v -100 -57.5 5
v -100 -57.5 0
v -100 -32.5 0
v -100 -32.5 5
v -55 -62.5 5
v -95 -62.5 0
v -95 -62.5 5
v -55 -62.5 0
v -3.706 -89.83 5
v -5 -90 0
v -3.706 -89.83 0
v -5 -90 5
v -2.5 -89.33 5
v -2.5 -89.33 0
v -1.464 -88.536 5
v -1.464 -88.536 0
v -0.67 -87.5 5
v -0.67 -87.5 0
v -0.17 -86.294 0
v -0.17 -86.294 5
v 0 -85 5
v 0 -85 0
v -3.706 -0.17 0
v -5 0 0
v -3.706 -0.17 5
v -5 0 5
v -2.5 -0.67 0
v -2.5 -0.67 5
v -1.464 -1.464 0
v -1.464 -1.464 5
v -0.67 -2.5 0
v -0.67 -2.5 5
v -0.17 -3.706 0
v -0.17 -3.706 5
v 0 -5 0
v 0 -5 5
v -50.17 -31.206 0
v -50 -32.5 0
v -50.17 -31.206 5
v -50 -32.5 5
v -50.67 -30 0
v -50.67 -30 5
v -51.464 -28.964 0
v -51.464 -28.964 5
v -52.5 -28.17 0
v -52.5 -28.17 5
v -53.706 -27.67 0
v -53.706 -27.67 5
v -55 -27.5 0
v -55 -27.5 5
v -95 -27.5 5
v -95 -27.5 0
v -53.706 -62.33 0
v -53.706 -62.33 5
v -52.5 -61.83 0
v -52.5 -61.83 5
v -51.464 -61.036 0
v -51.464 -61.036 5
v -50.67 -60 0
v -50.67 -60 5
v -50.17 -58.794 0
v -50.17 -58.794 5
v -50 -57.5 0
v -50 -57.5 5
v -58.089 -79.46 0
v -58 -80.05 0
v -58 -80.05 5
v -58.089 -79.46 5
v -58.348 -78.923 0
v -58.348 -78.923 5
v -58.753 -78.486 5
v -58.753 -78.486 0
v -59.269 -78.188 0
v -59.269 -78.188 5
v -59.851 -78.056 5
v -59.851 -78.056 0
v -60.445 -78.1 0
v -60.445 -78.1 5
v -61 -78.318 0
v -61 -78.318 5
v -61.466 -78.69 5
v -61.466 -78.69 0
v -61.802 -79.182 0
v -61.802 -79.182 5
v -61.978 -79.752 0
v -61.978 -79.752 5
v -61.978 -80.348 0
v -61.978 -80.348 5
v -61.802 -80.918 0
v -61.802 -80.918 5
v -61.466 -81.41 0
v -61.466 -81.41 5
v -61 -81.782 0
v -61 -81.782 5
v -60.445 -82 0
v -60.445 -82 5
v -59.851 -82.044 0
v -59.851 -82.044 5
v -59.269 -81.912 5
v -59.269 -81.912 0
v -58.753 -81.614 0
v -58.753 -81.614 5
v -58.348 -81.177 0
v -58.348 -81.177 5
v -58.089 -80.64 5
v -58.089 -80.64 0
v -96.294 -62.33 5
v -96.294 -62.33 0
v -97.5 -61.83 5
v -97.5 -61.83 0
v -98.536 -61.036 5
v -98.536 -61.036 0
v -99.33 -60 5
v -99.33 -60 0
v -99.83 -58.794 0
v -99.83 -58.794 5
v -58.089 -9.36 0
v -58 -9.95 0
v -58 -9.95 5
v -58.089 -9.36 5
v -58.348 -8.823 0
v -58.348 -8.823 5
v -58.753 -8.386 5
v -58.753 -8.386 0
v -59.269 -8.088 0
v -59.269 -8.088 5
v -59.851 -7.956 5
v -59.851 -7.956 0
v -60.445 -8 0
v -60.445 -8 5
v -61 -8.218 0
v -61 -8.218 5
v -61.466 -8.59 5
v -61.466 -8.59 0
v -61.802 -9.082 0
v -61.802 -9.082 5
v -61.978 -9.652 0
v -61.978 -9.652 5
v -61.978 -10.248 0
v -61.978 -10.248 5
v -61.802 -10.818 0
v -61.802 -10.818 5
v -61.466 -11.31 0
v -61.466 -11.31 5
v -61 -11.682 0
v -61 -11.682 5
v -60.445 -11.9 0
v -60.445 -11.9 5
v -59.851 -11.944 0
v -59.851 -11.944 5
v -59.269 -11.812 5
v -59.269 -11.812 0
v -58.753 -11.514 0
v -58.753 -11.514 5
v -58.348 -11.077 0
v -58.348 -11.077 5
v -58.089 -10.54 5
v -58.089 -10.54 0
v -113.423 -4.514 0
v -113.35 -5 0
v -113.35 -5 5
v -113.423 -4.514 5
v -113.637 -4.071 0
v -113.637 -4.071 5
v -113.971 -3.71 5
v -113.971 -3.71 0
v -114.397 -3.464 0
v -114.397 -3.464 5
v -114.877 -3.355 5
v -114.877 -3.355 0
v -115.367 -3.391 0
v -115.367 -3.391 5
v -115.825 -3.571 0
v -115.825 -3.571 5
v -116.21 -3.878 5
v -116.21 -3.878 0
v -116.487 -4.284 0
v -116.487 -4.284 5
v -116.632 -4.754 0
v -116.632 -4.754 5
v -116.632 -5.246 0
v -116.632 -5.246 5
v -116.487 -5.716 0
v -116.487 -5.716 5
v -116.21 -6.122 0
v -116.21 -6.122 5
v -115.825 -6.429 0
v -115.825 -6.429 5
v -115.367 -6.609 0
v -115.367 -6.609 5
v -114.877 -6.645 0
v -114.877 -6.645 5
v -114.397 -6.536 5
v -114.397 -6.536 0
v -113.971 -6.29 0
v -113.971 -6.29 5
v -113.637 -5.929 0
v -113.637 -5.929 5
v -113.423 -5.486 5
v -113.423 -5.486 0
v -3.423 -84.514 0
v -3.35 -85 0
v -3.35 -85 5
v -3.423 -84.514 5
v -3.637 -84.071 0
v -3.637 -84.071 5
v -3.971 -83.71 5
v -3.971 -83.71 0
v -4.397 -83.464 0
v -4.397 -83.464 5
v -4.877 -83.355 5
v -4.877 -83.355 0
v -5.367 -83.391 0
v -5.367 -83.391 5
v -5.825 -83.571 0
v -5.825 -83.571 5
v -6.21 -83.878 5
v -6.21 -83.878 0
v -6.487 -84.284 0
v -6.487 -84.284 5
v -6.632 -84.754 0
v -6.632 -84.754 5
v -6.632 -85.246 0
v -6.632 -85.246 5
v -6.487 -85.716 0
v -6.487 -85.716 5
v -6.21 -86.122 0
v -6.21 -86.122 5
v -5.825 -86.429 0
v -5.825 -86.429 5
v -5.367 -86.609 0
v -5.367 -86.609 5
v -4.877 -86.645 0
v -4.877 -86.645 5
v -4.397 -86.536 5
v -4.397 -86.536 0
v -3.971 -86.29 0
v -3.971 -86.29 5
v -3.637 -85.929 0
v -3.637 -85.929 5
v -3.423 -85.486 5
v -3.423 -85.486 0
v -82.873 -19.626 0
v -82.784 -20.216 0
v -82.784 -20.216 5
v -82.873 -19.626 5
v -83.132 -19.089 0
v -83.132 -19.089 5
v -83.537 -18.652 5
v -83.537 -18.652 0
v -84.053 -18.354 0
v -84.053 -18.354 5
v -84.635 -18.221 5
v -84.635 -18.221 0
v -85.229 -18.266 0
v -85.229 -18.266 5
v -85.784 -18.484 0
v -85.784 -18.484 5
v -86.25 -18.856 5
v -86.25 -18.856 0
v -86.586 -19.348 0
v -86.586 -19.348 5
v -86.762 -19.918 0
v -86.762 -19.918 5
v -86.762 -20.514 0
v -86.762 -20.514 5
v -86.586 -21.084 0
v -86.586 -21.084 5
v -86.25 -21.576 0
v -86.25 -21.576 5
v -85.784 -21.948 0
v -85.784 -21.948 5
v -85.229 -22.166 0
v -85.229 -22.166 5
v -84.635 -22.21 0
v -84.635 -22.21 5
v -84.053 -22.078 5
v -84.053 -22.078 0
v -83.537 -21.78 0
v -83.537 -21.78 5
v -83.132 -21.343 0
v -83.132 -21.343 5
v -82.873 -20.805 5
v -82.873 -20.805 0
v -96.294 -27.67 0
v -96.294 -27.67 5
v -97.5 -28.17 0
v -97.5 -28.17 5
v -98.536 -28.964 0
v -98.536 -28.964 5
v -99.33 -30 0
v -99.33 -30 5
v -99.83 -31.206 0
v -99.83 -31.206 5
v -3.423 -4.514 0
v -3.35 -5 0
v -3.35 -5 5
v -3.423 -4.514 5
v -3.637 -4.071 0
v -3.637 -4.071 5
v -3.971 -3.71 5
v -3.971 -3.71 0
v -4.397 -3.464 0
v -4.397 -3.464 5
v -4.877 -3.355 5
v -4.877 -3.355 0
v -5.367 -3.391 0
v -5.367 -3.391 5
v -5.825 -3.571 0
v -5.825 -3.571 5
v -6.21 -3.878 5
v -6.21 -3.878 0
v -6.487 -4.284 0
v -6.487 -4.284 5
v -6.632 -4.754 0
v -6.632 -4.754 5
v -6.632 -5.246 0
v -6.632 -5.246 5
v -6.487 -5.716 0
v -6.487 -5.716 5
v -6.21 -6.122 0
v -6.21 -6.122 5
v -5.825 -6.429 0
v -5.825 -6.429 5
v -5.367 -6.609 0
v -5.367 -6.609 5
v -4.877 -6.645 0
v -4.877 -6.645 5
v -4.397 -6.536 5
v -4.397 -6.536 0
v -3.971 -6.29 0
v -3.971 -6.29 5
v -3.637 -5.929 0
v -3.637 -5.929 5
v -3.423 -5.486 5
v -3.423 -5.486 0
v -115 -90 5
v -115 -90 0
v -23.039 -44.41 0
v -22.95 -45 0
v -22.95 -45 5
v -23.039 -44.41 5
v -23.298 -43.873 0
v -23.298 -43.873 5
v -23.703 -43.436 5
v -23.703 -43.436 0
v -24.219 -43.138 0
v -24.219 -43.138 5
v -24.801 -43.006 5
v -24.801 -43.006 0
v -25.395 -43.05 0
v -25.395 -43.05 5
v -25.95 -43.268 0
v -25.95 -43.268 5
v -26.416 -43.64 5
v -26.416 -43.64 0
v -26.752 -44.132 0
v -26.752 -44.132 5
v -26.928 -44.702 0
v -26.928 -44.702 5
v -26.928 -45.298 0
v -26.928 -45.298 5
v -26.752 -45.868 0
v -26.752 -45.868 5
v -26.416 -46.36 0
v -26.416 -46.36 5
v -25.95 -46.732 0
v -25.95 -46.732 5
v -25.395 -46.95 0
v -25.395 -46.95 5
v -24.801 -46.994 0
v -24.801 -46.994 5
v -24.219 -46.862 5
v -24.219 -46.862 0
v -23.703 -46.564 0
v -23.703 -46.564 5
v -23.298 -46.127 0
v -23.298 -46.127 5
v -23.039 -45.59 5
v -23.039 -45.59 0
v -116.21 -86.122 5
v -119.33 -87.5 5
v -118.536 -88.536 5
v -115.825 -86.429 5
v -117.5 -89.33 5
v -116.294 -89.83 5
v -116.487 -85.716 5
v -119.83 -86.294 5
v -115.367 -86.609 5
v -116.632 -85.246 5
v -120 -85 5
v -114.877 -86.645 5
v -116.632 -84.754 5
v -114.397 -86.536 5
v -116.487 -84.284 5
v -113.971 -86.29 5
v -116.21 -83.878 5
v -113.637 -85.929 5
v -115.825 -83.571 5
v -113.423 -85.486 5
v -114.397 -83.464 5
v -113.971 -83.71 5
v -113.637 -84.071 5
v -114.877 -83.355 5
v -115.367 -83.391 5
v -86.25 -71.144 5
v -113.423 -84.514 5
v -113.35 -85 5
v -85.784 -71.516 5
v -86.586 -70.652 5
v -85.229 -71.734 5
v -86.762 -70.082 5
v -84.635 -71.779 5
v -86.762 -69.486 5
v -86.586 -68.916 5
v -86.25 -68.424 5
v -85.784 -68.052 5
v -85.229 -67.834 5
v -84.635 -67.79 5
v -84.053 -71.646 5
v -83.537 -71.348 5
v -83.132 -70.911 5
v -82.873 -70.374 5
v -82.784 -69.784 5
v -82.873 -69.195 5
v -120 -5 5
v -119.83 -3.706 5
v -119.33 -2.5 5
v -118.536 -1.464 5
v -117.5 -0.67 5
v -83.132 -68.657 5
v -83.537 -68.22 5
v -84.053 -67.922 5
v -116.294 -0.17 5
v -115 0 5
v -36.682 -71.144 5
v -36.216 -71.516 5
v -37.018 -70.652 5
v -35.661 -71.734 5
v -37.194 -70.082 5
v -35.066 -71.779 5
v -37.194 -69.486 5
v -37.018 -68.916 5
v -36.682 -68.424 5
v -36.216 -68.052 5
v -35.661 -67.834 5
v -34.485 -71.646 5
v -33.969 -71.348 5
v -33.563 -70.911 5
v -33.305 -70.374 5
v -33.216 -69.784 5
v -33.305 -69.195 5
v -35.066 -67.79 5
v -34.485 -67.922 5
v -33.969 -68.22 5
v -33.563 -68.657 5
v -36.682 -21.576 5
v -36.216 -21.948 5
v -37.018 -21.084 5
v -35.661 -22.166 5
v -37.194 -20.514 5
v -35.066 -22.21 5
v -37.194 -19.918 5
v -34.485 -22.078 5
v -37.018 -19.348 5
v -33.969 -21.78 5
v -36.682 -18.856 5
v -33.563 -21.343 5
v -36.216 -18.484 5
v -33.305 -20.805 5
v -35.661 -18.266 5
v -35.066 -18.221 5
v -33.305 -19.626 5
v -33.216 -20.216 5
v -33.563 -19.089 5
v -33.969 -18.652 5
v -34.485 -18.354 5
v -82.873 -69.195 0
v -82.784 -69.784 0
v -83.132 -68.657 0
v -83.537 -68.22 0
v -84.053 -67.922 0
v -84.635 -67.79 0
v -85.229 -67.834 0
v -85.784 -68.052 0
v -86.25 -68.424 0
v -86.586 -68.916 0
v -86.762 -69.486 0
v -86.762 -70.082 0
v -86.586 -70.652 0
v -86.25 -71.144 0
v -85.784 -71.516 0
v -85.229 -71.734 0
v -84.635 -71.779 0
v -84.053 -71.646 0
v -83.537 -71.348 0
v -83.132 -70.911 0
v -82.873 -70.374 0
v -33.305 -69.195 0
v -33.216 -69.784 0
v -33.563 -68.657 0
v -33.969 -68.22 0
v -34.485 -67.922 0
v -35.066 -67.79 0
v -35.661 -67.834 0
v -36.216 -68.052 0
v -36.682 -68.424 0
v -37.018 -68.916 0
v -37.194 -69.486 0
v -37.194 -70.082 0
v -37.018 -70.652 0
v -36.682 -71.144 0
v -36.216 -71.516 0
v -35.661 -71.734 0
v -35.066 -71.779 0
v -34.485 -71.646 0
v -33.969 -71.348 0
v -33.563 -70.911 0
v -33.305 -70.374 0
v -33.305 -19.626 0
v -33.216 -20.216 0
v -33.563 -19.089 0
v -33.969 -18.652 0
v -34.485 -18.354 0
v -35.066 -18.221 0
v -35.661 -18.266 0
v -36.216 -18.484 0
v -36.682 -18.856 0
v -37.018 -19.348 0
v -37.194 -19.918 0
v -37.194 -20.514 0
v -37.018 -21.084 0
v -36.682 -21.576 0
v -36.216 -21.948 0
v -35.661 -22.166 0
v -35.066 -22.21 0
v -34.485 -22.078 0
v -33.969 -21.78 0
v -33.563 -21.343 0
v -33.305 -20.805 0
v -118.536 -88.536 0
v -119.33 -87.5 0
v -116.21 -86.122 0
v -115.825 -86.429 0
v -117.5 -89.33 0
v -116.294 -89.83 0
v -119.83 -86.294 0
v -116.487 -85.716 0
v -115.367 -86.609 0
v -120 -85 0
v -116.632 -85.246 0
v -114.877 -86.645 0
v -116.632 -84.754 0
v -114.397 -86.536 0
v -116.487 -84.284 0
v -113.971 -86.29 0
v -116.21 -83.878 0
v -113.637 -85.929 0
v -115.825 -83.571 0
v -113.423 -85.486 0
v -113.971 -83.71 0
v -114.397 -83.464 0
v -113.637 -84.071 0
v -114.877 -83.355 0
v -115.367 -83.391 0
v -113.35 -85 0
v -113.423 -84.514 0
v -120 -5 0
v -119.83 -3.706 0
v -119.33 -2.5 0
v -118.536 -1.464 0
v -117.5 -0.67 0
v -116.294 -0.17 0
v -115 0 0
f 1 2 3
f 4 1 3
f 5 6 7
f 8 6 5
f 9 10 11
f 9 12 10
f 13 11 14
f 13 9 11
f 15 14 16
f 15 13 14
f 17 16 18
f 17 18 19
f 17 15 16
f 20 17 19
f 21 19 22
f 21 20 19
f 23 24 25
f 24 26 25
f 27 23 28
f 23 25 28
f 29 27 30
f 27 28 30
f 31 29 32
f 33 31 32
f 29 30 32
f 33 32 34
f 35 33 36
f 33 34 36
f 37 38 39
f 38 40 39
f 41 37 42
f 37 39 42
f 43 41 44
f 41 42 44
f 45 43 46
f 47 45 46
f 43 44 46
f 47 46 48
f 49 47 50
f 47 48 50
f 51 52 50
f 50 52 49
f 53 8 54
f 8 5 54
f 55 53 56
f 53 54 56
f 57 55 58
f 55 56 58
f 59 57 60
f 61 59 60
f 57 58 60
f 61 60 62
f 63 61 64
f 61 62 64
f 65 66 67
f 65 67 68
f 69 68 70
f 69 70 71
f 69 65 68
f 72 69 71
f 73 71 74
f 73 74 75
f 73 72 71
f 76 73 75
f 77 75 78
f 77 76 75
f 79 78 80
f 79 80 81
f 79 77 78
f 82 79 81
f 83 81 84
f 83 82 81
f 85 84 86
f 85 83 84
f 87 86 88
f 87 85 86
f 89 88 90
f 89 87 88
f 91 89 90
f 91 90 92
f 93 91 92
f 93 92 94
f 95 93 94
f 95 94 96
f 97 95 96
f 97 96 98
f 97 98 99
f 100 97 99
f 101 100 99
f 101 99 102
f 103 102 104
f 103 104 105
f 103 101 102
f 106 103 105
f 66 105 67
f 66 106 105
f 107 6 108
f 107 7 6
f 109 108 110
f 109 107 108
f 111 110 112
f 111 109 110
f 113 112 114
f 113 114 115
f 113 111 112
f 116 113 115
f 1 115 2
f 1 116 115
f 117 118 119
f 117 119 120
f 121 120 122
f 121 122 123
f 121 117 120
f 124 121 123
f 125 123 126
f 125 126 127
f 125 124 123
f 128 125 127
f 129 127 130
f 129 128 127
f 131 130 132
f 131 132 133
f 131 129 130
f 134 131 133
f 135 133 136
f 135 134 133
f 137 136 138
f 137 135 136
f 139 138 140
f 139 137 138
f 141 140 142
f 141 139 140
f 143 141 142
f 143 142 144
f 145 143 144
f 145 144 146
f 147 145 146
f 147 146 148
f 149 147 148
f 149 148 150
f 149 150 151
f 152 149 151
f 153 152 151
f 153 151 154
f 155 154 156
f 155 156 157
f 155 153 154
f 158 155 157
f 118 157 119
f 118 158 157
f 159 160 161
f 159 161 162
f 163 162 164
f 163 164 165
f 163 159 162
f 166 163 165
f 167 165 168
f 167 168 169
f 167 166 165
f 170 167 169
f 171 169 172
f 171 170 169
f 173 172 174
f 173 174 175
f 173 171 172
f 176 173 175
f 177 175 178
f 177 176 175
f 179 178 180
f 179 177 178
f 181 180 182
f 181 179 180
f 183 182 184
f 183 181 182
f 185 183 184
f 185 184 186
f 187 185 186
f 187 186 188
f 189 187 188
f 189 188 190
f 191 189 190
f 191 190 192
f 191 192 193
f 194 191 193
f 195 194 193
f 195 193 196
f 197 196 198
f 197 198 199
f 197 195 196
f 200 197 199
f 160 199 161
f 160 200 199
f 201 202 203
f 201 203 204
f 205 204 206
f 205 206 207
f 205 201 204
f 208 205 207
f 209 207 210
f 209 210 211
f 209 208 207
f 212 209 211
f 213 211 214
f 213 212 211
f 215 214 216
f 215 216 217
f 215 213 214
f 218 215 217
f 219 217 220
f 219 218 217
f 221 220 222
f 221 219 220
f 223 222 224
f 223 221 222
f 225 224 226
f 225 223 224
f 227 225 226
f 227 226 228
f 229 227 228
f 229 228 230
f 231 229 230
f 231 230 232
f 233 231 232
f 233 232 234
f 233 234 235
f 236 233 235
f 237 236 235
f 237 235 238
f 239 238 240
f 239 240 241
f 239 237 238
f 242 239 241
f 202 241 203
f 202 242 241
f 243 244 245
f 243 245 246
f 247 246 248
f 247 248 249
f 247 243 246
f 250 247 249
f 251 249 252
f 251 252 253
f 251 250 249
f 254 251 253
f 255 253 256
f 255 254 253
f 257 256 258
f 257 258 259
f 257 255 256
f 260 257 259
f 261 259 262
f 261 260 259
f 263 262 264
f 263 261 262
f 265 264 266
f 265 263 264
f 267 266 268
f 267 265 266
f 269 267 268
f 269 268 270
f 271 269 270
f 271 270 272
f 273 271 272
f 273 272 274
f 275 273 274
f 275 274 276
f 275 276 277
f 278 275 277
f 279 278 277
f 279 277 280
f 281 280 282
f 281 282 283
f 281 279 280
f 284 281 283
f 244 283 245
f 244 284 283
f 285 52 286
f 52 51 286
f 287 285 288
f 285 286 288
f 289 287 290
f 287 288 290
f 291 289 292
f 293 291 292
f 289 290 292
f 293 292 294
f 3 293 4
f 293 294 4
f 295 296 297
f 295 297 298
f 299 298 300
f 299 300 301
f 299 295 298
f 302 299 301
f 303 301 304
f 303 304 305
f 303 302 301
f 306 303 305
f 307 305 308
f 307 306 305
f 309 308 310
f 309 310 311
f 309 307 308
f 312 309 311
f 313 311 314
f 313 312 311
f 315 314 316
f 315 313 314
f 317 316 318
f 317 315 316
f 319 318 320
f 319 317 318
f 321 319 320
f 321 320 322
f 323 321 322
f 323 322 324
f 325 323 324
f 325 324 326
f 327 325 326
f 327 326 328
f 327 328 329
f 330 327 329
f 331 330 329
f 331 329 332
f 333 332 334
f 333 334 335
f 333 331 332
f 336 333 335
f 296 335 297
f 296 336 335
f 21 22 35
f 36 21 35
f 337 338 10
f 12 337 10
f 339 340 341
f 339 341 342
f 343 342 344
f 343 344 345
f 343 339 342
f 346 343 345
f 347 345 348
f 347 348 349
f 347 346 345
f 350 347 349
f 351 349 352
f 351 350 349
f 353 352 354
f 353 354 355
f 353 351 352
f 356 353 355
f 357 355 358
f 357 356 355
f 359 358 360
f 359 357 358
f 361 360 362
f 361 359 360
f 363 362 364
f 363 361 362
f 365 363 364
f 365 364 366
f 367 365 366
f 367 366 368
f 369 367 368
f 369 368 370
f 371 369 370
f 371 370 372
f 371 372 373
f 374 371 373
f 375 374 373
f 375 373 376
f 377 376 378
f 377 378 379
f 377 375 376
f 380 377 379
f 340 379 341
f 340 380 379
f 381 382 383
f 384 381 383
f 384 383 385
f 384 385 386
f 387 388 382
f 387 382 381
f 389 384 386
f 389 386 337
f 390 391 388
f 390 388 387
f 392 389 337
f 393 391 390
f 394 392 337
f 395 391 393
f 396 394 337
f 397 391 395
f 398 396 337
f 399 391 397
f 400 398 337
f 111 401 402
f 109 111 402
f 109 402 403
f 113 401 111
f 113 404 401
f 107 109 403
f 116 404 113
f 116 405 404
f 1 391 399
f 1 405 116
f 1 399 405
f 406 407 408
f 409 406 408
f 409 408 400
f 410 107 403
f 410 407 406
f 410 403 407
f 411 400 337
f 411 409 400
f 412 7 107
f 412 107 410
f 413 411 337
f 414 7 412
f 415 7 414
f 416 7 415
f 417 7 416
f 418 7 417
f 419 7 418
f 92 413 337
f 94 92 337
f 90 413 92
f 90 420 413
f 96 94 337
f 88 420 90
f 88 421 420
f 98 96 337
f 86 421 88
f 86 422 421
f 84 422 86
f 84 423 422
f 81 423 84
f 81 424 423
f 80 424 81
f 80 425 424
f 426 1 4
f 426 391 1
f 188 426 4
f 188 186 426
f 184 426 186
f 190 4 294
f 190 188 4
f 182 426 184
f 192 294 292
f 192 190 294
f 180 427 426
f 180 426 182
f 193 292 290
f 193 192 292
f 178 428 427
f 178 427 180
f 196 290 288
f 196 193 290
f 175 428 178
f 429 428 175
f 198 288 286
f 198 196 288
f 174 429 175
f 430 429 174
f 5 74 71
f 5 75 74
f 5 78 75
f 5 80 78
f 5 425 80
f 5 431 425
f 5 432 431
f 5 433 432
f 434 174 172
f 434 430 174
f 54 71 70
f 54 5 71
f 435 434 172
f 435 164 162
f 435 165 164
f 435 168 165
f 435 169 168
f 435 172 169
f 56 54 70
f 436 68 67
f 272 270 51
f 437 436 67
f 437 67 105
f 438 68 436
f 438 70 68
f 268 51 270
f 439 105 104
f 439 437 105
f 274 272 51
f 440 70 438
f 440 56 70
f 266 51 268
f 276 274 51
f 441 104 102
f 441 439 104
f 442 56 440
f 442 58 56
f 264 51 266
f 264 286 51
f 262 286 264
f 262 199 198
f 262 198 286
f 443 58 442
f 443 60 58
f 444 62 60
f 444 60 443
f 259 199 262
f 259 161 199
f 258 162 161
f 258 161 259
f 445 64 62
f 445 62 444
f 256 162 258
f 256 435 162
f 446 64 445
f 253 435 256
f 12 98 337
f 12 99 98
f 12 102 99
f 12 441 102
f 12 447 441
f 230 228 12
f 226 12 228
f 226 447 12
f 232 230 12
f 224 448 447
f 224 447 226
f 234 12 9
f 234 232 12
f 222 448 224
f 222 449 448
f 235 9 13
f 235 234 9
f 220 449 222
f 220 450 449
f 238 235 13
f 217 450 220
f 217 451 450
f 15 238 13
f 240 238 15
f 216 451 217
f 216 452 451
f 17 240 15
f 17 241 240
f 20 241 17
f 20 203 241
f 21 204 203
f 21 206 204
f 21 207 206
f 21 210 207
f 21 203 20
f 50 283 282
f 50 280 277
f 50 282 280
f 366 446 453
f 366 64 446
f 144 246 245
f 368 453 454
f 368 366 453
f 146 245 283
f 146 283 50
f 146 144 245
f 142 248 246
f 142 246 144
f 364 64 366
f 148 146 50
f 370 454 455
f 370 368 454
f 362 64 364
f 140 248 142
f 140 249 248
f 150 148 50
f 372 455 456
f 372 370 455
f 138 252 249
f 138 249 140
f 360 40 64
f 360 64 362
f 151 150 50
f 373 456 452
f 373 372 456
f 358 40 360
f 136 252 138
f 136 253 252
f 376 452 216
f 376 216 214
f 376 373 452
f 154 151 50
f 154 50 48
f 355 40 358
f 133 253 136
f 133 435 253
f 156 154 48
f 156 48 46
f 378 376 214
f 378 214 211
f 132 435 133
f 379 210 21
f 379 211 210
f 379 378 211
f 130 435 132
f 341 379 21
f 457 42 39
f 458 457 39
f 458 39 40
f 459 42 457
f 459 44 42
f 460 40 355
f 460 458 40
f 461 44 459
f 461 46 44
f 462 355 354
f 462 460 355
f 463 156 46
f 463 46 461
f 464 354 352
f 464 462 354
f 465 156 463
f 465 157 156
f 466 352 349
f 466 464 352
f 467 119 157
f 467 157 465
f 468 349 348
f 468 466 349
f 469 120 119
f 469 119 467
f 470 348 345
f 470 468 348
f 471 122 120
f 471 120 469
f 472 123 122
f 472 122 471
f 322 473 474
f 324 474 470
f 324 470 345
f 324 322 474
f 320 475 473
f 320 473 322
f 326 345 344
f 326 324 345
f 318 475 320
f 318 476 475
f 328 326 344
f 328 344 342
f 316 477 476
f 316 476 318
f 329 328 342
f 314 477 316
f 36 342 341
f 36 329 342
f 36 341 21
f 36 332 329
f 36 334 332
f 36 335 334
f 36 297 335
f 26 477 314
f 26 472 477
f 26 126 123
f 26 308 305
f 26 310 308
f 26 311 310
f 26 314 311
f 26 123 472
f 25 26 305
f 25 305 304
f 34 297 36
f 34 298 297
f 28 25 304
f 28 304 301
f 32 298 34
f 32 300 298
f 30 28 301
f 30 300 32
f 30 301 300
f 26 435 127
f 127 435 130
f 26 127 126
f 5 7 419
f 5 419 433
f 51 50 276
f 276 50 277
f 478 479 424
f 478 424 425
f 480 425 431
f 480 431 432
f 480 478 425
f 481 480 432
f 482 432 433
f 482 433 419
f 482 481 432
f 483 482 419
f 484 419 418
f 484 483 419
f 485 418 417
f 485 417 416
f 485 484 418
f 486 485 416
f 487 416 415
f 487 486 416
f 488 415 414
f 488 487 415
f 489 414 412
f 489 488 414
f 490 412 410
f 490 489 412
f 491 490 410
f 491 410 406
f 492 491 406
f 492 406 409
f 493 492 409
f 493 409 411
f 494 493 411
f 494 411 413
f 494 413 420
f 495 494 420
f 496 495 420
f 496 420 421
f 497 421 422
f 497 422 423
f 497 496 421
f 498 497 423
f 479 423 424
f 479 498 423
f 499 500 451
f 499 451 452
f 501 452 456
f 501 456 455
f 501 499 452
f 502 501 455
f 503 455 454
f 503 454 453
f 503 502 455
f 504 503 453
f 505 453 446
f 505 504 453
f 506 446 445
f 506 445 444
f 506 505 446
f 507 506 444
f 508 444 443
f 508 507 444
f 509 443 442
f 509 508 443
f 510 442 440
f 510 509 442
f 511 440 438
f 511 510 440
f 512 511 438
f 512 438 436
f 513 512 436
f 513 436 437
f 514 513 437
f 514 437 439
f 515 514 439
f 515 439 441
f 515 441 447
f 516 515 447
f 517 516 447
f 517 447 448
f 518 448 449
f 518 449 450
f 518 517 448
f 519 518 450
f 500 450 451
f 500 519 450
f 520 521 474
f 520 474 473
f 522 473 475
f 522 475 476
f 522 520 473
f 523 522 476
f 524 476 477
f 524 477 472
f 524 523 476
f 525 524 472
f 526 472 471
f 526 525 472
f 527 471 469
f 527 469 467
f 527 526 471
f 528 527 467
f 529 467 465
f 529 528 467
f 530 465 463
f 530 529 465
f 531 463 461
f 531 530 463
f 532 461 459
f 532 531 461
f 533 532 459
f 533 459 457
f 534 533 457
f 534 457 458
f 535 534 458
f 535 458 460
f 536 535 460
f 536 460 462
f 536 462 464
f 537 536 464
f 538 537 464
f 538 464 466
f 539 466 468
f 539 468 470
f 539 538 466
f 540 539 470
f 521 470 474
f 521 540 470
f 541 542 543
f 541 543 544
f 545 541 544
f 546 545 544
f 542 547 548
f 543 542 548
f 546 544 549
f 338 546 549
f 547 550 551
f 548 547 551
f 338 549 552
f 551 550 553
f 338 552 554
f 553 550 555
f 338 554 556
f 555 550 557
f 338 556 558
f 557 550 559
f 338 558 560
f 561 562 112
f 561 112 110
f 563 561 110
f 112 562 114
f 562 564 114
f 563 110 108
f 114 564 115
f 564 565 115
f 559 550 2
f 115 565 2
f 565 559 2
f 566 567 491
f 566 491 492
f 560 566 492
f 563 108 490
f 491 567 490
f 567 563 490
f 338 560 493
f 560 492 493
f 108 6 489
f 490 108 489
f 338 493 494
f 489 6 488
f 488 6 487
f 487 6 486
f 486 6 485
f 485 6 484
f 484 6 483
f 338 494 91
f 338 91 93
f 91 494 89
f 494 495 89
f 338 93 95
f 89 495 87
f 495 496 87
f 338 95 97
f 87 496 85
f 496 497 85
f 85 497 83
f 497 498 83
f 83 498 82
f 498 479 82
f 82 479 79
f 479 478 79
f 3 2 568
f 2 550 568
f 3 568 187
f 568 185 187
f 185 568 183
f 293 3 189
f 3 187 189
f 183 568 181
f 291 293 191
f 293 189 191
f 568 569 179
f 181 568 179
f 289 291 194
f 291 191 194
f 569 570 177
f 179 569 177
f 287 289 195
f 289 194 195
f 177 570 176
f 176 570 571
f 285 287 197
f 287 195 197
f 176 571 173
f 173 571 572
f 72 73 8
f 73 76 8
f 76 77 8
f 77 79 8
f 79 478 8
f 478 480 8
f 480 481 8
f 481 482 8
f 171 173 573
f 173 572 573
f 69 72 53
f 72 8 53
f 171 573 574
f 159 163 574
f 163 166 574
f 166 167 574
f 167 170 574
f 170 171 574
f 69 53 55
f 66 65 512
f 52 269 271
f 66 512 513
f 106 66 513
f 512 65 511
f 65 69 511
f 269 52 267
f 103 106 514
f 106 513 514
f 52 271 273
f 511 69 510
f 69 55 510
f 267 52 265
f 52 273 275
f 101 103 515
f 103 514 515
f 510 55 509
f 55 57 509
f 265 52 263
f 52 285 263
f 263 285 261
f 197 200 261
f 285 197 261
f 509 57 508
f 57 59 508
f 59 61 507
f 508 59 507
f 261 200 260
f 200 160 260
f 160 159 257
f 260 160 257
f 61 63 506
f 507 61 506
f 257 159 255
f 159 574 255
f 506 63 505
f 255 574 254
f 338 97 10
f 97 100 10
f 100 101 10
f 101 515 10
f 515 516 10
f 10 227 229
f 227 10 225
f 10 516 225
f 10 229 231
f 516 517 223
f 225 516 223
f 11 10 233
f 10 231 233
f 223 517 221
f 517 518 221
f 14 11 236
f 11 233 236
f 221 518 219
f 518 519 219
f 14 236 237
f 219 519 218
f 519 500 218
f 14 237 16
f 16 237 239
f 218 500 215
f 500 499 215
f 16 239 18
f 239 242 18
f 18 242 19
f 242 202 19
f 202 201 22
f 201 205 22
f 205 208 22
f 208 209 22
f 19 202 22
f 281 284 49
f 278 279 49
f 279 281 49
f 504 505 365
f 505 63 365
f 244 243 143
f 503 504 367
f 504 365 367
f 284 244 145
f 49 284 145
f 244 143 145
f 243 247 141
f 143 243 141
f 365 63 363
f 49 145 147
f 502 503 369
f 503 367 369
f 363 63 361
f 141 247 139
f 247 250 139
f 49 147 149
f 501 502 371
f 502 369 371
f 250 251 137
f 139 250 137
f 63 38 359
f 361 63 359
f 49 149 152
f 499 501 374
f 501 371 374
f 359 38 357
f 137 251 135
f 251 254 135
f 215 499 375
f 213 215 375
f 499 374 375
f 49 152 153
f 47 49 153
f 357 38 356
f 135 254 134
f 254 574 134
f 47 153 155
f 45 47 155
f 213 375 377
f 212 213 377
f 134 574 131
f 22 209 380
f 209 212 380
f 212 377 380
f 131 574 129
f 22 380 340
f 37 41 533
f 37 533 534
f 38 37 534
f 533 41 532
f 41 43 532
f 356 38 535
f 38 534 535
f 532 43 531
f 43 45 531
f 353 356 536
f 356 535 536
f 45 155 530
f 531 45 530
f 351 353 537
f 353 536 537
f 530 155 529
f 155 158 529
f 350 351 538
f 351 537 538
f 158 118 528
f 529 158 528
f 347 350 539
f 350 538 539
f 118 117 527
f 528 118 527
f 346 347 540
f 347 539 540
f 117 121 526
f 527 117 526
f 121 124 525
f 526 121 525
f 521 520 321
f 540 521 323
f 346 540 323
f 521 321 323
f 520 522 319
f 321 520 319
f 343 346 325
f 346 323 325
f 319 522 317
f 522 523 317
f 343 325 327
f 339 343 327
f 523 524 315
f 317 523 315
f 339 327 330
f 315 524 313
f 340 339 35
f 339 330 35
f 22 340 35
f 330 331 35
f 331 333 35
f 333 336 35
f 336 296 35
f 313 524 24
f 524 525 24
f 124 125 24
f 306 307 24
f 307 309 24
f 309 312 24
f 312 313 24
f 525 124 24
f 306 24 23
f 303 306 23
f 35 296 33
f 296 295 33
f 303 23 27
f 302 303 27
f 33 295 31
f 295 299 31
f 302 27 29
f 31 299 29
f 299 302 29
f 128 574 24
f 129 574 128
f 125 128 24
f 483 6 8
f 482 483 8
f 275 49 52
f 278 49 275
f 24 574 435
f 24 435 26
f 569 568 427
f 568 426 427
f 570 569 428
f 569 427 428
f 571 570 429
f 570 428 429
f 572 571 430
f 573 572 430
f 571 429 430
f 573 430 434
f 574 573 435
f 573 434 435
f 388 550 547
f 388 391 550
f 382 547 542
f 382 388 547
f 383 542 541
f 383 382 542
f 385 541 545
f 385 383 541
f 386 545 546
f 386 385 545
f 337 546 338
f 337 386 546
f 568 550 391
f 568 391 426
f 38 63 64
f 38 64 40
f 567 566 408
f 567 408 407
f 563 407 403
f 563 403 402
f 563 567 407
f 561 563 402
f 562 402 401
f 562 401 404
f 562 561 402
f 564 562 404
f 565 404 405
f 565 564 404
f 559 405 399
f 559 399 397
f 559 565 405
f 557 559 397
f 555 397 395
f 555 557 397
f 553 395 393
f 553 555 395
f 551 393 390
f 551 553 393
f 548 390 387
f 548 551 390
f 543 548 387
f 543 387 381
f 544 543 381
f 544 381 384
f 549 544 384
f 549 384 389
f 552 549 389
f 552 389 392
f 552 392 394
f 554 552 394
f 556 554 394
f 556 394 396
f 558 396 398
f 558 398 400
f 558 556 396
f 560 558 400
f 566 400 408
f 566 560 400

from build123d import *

# Parameters (mm, degrees)
SKETCH_1_W      = 120
SKETCH_1_H      = 90
SKETCH_1_R      = 1.65
SKETCH_1_R_2    = 2
SKETCH_1_W_2    = 50
SKETCH_1_H_2    = 35
EXTRUDE_1_DEPTH = 5
FILLET_1_R      = 5
FILLET_2_R      = 5


with BuildPart() as part:
    # 草图1 → 凸台-拉伸1 (new body)
    with BuildSketch(Plane.XY):
        with Locations((-60, -45)):
            Rectangle(SKETCH_1_W, SKETCH_1_H)
        with Locations((-115, -85)):
            Circle(SKETCH_1_R, mode=Mode.SUBTRACT)
        with Locations((-5, -85)):
            Circle(SKETCH_1_R, mode=Mode.SUBTRACT)
        with Locations((-5, -5)):
            Circle(SKETCH_1_R, mode=Mode.SUBTRACT)
        with Locations((-115, -5)):
            Circle(SKETCH_1_R, mode=Mode.SUBTRACT)
        with Locations((-24.95, -45)):
            Circle(SKETCH_1_R_2, mode=Mode.SUBTRACT)
        with Locations((-35.215907319, -69.784092681)):
            Circle(SKETCH_1_R_2, mode=Mode.SUBTRACT)
        with Locations((-60, -80.05)):
            Circle(SKETCH_1_R_2, mode=Mode.SUBTRACT)
        with Locations((-84.784092681, -69.784092681)):
            Circle(SKETCH_1_R_2, mode=Mode.SUBTRACT)
        with Locations((-84.784092681, -20.215907319)):
            Circle(SKETCH_1_R_2, mode=Mode.SUBTRACT)
        with Locations((-60, -9.95)):
            Circle(SKETCH_1_R_2, mode=Mode.SUBTRACT)
        with Locations((-35.215907319, -20.215907319)):
            Circle(SKETCH_1_R_2, mode=Mode.SUBTRACT)
        with Locations((-75, -45)):
            Rectangle(SKETCH_1_W_2, SKETCH_1_H_2, mode=Mode.SUBTRACT)
    extrude(amount=EXTRUDE_1_DEPTH)

    # 圆角1
    fillet_1_edges = [part.edges().sort_by_distance(p)[0] for p in [
        (0, -90, 2.5),
        (-120, -90, 2.5),
        (-120, 0, 2.5),
        (0, 0, 2.5),
    ]]
    fillet(fillet_1_edges, radius=FILLET_1_R)

    # 圆角2
    fillet_2_edges = [part.edges().sort_by_distance(p)[0] for p in [
        (-100, -27.5, 2.5),
        (-100, -62.5, 2.5),
        (-50, -62.5, 2.5),
        (-50, -27.5, 2.5),
    ]]
    fillet(fillet_2_edges, radius=FILLET_2_R)


solid = part.part
